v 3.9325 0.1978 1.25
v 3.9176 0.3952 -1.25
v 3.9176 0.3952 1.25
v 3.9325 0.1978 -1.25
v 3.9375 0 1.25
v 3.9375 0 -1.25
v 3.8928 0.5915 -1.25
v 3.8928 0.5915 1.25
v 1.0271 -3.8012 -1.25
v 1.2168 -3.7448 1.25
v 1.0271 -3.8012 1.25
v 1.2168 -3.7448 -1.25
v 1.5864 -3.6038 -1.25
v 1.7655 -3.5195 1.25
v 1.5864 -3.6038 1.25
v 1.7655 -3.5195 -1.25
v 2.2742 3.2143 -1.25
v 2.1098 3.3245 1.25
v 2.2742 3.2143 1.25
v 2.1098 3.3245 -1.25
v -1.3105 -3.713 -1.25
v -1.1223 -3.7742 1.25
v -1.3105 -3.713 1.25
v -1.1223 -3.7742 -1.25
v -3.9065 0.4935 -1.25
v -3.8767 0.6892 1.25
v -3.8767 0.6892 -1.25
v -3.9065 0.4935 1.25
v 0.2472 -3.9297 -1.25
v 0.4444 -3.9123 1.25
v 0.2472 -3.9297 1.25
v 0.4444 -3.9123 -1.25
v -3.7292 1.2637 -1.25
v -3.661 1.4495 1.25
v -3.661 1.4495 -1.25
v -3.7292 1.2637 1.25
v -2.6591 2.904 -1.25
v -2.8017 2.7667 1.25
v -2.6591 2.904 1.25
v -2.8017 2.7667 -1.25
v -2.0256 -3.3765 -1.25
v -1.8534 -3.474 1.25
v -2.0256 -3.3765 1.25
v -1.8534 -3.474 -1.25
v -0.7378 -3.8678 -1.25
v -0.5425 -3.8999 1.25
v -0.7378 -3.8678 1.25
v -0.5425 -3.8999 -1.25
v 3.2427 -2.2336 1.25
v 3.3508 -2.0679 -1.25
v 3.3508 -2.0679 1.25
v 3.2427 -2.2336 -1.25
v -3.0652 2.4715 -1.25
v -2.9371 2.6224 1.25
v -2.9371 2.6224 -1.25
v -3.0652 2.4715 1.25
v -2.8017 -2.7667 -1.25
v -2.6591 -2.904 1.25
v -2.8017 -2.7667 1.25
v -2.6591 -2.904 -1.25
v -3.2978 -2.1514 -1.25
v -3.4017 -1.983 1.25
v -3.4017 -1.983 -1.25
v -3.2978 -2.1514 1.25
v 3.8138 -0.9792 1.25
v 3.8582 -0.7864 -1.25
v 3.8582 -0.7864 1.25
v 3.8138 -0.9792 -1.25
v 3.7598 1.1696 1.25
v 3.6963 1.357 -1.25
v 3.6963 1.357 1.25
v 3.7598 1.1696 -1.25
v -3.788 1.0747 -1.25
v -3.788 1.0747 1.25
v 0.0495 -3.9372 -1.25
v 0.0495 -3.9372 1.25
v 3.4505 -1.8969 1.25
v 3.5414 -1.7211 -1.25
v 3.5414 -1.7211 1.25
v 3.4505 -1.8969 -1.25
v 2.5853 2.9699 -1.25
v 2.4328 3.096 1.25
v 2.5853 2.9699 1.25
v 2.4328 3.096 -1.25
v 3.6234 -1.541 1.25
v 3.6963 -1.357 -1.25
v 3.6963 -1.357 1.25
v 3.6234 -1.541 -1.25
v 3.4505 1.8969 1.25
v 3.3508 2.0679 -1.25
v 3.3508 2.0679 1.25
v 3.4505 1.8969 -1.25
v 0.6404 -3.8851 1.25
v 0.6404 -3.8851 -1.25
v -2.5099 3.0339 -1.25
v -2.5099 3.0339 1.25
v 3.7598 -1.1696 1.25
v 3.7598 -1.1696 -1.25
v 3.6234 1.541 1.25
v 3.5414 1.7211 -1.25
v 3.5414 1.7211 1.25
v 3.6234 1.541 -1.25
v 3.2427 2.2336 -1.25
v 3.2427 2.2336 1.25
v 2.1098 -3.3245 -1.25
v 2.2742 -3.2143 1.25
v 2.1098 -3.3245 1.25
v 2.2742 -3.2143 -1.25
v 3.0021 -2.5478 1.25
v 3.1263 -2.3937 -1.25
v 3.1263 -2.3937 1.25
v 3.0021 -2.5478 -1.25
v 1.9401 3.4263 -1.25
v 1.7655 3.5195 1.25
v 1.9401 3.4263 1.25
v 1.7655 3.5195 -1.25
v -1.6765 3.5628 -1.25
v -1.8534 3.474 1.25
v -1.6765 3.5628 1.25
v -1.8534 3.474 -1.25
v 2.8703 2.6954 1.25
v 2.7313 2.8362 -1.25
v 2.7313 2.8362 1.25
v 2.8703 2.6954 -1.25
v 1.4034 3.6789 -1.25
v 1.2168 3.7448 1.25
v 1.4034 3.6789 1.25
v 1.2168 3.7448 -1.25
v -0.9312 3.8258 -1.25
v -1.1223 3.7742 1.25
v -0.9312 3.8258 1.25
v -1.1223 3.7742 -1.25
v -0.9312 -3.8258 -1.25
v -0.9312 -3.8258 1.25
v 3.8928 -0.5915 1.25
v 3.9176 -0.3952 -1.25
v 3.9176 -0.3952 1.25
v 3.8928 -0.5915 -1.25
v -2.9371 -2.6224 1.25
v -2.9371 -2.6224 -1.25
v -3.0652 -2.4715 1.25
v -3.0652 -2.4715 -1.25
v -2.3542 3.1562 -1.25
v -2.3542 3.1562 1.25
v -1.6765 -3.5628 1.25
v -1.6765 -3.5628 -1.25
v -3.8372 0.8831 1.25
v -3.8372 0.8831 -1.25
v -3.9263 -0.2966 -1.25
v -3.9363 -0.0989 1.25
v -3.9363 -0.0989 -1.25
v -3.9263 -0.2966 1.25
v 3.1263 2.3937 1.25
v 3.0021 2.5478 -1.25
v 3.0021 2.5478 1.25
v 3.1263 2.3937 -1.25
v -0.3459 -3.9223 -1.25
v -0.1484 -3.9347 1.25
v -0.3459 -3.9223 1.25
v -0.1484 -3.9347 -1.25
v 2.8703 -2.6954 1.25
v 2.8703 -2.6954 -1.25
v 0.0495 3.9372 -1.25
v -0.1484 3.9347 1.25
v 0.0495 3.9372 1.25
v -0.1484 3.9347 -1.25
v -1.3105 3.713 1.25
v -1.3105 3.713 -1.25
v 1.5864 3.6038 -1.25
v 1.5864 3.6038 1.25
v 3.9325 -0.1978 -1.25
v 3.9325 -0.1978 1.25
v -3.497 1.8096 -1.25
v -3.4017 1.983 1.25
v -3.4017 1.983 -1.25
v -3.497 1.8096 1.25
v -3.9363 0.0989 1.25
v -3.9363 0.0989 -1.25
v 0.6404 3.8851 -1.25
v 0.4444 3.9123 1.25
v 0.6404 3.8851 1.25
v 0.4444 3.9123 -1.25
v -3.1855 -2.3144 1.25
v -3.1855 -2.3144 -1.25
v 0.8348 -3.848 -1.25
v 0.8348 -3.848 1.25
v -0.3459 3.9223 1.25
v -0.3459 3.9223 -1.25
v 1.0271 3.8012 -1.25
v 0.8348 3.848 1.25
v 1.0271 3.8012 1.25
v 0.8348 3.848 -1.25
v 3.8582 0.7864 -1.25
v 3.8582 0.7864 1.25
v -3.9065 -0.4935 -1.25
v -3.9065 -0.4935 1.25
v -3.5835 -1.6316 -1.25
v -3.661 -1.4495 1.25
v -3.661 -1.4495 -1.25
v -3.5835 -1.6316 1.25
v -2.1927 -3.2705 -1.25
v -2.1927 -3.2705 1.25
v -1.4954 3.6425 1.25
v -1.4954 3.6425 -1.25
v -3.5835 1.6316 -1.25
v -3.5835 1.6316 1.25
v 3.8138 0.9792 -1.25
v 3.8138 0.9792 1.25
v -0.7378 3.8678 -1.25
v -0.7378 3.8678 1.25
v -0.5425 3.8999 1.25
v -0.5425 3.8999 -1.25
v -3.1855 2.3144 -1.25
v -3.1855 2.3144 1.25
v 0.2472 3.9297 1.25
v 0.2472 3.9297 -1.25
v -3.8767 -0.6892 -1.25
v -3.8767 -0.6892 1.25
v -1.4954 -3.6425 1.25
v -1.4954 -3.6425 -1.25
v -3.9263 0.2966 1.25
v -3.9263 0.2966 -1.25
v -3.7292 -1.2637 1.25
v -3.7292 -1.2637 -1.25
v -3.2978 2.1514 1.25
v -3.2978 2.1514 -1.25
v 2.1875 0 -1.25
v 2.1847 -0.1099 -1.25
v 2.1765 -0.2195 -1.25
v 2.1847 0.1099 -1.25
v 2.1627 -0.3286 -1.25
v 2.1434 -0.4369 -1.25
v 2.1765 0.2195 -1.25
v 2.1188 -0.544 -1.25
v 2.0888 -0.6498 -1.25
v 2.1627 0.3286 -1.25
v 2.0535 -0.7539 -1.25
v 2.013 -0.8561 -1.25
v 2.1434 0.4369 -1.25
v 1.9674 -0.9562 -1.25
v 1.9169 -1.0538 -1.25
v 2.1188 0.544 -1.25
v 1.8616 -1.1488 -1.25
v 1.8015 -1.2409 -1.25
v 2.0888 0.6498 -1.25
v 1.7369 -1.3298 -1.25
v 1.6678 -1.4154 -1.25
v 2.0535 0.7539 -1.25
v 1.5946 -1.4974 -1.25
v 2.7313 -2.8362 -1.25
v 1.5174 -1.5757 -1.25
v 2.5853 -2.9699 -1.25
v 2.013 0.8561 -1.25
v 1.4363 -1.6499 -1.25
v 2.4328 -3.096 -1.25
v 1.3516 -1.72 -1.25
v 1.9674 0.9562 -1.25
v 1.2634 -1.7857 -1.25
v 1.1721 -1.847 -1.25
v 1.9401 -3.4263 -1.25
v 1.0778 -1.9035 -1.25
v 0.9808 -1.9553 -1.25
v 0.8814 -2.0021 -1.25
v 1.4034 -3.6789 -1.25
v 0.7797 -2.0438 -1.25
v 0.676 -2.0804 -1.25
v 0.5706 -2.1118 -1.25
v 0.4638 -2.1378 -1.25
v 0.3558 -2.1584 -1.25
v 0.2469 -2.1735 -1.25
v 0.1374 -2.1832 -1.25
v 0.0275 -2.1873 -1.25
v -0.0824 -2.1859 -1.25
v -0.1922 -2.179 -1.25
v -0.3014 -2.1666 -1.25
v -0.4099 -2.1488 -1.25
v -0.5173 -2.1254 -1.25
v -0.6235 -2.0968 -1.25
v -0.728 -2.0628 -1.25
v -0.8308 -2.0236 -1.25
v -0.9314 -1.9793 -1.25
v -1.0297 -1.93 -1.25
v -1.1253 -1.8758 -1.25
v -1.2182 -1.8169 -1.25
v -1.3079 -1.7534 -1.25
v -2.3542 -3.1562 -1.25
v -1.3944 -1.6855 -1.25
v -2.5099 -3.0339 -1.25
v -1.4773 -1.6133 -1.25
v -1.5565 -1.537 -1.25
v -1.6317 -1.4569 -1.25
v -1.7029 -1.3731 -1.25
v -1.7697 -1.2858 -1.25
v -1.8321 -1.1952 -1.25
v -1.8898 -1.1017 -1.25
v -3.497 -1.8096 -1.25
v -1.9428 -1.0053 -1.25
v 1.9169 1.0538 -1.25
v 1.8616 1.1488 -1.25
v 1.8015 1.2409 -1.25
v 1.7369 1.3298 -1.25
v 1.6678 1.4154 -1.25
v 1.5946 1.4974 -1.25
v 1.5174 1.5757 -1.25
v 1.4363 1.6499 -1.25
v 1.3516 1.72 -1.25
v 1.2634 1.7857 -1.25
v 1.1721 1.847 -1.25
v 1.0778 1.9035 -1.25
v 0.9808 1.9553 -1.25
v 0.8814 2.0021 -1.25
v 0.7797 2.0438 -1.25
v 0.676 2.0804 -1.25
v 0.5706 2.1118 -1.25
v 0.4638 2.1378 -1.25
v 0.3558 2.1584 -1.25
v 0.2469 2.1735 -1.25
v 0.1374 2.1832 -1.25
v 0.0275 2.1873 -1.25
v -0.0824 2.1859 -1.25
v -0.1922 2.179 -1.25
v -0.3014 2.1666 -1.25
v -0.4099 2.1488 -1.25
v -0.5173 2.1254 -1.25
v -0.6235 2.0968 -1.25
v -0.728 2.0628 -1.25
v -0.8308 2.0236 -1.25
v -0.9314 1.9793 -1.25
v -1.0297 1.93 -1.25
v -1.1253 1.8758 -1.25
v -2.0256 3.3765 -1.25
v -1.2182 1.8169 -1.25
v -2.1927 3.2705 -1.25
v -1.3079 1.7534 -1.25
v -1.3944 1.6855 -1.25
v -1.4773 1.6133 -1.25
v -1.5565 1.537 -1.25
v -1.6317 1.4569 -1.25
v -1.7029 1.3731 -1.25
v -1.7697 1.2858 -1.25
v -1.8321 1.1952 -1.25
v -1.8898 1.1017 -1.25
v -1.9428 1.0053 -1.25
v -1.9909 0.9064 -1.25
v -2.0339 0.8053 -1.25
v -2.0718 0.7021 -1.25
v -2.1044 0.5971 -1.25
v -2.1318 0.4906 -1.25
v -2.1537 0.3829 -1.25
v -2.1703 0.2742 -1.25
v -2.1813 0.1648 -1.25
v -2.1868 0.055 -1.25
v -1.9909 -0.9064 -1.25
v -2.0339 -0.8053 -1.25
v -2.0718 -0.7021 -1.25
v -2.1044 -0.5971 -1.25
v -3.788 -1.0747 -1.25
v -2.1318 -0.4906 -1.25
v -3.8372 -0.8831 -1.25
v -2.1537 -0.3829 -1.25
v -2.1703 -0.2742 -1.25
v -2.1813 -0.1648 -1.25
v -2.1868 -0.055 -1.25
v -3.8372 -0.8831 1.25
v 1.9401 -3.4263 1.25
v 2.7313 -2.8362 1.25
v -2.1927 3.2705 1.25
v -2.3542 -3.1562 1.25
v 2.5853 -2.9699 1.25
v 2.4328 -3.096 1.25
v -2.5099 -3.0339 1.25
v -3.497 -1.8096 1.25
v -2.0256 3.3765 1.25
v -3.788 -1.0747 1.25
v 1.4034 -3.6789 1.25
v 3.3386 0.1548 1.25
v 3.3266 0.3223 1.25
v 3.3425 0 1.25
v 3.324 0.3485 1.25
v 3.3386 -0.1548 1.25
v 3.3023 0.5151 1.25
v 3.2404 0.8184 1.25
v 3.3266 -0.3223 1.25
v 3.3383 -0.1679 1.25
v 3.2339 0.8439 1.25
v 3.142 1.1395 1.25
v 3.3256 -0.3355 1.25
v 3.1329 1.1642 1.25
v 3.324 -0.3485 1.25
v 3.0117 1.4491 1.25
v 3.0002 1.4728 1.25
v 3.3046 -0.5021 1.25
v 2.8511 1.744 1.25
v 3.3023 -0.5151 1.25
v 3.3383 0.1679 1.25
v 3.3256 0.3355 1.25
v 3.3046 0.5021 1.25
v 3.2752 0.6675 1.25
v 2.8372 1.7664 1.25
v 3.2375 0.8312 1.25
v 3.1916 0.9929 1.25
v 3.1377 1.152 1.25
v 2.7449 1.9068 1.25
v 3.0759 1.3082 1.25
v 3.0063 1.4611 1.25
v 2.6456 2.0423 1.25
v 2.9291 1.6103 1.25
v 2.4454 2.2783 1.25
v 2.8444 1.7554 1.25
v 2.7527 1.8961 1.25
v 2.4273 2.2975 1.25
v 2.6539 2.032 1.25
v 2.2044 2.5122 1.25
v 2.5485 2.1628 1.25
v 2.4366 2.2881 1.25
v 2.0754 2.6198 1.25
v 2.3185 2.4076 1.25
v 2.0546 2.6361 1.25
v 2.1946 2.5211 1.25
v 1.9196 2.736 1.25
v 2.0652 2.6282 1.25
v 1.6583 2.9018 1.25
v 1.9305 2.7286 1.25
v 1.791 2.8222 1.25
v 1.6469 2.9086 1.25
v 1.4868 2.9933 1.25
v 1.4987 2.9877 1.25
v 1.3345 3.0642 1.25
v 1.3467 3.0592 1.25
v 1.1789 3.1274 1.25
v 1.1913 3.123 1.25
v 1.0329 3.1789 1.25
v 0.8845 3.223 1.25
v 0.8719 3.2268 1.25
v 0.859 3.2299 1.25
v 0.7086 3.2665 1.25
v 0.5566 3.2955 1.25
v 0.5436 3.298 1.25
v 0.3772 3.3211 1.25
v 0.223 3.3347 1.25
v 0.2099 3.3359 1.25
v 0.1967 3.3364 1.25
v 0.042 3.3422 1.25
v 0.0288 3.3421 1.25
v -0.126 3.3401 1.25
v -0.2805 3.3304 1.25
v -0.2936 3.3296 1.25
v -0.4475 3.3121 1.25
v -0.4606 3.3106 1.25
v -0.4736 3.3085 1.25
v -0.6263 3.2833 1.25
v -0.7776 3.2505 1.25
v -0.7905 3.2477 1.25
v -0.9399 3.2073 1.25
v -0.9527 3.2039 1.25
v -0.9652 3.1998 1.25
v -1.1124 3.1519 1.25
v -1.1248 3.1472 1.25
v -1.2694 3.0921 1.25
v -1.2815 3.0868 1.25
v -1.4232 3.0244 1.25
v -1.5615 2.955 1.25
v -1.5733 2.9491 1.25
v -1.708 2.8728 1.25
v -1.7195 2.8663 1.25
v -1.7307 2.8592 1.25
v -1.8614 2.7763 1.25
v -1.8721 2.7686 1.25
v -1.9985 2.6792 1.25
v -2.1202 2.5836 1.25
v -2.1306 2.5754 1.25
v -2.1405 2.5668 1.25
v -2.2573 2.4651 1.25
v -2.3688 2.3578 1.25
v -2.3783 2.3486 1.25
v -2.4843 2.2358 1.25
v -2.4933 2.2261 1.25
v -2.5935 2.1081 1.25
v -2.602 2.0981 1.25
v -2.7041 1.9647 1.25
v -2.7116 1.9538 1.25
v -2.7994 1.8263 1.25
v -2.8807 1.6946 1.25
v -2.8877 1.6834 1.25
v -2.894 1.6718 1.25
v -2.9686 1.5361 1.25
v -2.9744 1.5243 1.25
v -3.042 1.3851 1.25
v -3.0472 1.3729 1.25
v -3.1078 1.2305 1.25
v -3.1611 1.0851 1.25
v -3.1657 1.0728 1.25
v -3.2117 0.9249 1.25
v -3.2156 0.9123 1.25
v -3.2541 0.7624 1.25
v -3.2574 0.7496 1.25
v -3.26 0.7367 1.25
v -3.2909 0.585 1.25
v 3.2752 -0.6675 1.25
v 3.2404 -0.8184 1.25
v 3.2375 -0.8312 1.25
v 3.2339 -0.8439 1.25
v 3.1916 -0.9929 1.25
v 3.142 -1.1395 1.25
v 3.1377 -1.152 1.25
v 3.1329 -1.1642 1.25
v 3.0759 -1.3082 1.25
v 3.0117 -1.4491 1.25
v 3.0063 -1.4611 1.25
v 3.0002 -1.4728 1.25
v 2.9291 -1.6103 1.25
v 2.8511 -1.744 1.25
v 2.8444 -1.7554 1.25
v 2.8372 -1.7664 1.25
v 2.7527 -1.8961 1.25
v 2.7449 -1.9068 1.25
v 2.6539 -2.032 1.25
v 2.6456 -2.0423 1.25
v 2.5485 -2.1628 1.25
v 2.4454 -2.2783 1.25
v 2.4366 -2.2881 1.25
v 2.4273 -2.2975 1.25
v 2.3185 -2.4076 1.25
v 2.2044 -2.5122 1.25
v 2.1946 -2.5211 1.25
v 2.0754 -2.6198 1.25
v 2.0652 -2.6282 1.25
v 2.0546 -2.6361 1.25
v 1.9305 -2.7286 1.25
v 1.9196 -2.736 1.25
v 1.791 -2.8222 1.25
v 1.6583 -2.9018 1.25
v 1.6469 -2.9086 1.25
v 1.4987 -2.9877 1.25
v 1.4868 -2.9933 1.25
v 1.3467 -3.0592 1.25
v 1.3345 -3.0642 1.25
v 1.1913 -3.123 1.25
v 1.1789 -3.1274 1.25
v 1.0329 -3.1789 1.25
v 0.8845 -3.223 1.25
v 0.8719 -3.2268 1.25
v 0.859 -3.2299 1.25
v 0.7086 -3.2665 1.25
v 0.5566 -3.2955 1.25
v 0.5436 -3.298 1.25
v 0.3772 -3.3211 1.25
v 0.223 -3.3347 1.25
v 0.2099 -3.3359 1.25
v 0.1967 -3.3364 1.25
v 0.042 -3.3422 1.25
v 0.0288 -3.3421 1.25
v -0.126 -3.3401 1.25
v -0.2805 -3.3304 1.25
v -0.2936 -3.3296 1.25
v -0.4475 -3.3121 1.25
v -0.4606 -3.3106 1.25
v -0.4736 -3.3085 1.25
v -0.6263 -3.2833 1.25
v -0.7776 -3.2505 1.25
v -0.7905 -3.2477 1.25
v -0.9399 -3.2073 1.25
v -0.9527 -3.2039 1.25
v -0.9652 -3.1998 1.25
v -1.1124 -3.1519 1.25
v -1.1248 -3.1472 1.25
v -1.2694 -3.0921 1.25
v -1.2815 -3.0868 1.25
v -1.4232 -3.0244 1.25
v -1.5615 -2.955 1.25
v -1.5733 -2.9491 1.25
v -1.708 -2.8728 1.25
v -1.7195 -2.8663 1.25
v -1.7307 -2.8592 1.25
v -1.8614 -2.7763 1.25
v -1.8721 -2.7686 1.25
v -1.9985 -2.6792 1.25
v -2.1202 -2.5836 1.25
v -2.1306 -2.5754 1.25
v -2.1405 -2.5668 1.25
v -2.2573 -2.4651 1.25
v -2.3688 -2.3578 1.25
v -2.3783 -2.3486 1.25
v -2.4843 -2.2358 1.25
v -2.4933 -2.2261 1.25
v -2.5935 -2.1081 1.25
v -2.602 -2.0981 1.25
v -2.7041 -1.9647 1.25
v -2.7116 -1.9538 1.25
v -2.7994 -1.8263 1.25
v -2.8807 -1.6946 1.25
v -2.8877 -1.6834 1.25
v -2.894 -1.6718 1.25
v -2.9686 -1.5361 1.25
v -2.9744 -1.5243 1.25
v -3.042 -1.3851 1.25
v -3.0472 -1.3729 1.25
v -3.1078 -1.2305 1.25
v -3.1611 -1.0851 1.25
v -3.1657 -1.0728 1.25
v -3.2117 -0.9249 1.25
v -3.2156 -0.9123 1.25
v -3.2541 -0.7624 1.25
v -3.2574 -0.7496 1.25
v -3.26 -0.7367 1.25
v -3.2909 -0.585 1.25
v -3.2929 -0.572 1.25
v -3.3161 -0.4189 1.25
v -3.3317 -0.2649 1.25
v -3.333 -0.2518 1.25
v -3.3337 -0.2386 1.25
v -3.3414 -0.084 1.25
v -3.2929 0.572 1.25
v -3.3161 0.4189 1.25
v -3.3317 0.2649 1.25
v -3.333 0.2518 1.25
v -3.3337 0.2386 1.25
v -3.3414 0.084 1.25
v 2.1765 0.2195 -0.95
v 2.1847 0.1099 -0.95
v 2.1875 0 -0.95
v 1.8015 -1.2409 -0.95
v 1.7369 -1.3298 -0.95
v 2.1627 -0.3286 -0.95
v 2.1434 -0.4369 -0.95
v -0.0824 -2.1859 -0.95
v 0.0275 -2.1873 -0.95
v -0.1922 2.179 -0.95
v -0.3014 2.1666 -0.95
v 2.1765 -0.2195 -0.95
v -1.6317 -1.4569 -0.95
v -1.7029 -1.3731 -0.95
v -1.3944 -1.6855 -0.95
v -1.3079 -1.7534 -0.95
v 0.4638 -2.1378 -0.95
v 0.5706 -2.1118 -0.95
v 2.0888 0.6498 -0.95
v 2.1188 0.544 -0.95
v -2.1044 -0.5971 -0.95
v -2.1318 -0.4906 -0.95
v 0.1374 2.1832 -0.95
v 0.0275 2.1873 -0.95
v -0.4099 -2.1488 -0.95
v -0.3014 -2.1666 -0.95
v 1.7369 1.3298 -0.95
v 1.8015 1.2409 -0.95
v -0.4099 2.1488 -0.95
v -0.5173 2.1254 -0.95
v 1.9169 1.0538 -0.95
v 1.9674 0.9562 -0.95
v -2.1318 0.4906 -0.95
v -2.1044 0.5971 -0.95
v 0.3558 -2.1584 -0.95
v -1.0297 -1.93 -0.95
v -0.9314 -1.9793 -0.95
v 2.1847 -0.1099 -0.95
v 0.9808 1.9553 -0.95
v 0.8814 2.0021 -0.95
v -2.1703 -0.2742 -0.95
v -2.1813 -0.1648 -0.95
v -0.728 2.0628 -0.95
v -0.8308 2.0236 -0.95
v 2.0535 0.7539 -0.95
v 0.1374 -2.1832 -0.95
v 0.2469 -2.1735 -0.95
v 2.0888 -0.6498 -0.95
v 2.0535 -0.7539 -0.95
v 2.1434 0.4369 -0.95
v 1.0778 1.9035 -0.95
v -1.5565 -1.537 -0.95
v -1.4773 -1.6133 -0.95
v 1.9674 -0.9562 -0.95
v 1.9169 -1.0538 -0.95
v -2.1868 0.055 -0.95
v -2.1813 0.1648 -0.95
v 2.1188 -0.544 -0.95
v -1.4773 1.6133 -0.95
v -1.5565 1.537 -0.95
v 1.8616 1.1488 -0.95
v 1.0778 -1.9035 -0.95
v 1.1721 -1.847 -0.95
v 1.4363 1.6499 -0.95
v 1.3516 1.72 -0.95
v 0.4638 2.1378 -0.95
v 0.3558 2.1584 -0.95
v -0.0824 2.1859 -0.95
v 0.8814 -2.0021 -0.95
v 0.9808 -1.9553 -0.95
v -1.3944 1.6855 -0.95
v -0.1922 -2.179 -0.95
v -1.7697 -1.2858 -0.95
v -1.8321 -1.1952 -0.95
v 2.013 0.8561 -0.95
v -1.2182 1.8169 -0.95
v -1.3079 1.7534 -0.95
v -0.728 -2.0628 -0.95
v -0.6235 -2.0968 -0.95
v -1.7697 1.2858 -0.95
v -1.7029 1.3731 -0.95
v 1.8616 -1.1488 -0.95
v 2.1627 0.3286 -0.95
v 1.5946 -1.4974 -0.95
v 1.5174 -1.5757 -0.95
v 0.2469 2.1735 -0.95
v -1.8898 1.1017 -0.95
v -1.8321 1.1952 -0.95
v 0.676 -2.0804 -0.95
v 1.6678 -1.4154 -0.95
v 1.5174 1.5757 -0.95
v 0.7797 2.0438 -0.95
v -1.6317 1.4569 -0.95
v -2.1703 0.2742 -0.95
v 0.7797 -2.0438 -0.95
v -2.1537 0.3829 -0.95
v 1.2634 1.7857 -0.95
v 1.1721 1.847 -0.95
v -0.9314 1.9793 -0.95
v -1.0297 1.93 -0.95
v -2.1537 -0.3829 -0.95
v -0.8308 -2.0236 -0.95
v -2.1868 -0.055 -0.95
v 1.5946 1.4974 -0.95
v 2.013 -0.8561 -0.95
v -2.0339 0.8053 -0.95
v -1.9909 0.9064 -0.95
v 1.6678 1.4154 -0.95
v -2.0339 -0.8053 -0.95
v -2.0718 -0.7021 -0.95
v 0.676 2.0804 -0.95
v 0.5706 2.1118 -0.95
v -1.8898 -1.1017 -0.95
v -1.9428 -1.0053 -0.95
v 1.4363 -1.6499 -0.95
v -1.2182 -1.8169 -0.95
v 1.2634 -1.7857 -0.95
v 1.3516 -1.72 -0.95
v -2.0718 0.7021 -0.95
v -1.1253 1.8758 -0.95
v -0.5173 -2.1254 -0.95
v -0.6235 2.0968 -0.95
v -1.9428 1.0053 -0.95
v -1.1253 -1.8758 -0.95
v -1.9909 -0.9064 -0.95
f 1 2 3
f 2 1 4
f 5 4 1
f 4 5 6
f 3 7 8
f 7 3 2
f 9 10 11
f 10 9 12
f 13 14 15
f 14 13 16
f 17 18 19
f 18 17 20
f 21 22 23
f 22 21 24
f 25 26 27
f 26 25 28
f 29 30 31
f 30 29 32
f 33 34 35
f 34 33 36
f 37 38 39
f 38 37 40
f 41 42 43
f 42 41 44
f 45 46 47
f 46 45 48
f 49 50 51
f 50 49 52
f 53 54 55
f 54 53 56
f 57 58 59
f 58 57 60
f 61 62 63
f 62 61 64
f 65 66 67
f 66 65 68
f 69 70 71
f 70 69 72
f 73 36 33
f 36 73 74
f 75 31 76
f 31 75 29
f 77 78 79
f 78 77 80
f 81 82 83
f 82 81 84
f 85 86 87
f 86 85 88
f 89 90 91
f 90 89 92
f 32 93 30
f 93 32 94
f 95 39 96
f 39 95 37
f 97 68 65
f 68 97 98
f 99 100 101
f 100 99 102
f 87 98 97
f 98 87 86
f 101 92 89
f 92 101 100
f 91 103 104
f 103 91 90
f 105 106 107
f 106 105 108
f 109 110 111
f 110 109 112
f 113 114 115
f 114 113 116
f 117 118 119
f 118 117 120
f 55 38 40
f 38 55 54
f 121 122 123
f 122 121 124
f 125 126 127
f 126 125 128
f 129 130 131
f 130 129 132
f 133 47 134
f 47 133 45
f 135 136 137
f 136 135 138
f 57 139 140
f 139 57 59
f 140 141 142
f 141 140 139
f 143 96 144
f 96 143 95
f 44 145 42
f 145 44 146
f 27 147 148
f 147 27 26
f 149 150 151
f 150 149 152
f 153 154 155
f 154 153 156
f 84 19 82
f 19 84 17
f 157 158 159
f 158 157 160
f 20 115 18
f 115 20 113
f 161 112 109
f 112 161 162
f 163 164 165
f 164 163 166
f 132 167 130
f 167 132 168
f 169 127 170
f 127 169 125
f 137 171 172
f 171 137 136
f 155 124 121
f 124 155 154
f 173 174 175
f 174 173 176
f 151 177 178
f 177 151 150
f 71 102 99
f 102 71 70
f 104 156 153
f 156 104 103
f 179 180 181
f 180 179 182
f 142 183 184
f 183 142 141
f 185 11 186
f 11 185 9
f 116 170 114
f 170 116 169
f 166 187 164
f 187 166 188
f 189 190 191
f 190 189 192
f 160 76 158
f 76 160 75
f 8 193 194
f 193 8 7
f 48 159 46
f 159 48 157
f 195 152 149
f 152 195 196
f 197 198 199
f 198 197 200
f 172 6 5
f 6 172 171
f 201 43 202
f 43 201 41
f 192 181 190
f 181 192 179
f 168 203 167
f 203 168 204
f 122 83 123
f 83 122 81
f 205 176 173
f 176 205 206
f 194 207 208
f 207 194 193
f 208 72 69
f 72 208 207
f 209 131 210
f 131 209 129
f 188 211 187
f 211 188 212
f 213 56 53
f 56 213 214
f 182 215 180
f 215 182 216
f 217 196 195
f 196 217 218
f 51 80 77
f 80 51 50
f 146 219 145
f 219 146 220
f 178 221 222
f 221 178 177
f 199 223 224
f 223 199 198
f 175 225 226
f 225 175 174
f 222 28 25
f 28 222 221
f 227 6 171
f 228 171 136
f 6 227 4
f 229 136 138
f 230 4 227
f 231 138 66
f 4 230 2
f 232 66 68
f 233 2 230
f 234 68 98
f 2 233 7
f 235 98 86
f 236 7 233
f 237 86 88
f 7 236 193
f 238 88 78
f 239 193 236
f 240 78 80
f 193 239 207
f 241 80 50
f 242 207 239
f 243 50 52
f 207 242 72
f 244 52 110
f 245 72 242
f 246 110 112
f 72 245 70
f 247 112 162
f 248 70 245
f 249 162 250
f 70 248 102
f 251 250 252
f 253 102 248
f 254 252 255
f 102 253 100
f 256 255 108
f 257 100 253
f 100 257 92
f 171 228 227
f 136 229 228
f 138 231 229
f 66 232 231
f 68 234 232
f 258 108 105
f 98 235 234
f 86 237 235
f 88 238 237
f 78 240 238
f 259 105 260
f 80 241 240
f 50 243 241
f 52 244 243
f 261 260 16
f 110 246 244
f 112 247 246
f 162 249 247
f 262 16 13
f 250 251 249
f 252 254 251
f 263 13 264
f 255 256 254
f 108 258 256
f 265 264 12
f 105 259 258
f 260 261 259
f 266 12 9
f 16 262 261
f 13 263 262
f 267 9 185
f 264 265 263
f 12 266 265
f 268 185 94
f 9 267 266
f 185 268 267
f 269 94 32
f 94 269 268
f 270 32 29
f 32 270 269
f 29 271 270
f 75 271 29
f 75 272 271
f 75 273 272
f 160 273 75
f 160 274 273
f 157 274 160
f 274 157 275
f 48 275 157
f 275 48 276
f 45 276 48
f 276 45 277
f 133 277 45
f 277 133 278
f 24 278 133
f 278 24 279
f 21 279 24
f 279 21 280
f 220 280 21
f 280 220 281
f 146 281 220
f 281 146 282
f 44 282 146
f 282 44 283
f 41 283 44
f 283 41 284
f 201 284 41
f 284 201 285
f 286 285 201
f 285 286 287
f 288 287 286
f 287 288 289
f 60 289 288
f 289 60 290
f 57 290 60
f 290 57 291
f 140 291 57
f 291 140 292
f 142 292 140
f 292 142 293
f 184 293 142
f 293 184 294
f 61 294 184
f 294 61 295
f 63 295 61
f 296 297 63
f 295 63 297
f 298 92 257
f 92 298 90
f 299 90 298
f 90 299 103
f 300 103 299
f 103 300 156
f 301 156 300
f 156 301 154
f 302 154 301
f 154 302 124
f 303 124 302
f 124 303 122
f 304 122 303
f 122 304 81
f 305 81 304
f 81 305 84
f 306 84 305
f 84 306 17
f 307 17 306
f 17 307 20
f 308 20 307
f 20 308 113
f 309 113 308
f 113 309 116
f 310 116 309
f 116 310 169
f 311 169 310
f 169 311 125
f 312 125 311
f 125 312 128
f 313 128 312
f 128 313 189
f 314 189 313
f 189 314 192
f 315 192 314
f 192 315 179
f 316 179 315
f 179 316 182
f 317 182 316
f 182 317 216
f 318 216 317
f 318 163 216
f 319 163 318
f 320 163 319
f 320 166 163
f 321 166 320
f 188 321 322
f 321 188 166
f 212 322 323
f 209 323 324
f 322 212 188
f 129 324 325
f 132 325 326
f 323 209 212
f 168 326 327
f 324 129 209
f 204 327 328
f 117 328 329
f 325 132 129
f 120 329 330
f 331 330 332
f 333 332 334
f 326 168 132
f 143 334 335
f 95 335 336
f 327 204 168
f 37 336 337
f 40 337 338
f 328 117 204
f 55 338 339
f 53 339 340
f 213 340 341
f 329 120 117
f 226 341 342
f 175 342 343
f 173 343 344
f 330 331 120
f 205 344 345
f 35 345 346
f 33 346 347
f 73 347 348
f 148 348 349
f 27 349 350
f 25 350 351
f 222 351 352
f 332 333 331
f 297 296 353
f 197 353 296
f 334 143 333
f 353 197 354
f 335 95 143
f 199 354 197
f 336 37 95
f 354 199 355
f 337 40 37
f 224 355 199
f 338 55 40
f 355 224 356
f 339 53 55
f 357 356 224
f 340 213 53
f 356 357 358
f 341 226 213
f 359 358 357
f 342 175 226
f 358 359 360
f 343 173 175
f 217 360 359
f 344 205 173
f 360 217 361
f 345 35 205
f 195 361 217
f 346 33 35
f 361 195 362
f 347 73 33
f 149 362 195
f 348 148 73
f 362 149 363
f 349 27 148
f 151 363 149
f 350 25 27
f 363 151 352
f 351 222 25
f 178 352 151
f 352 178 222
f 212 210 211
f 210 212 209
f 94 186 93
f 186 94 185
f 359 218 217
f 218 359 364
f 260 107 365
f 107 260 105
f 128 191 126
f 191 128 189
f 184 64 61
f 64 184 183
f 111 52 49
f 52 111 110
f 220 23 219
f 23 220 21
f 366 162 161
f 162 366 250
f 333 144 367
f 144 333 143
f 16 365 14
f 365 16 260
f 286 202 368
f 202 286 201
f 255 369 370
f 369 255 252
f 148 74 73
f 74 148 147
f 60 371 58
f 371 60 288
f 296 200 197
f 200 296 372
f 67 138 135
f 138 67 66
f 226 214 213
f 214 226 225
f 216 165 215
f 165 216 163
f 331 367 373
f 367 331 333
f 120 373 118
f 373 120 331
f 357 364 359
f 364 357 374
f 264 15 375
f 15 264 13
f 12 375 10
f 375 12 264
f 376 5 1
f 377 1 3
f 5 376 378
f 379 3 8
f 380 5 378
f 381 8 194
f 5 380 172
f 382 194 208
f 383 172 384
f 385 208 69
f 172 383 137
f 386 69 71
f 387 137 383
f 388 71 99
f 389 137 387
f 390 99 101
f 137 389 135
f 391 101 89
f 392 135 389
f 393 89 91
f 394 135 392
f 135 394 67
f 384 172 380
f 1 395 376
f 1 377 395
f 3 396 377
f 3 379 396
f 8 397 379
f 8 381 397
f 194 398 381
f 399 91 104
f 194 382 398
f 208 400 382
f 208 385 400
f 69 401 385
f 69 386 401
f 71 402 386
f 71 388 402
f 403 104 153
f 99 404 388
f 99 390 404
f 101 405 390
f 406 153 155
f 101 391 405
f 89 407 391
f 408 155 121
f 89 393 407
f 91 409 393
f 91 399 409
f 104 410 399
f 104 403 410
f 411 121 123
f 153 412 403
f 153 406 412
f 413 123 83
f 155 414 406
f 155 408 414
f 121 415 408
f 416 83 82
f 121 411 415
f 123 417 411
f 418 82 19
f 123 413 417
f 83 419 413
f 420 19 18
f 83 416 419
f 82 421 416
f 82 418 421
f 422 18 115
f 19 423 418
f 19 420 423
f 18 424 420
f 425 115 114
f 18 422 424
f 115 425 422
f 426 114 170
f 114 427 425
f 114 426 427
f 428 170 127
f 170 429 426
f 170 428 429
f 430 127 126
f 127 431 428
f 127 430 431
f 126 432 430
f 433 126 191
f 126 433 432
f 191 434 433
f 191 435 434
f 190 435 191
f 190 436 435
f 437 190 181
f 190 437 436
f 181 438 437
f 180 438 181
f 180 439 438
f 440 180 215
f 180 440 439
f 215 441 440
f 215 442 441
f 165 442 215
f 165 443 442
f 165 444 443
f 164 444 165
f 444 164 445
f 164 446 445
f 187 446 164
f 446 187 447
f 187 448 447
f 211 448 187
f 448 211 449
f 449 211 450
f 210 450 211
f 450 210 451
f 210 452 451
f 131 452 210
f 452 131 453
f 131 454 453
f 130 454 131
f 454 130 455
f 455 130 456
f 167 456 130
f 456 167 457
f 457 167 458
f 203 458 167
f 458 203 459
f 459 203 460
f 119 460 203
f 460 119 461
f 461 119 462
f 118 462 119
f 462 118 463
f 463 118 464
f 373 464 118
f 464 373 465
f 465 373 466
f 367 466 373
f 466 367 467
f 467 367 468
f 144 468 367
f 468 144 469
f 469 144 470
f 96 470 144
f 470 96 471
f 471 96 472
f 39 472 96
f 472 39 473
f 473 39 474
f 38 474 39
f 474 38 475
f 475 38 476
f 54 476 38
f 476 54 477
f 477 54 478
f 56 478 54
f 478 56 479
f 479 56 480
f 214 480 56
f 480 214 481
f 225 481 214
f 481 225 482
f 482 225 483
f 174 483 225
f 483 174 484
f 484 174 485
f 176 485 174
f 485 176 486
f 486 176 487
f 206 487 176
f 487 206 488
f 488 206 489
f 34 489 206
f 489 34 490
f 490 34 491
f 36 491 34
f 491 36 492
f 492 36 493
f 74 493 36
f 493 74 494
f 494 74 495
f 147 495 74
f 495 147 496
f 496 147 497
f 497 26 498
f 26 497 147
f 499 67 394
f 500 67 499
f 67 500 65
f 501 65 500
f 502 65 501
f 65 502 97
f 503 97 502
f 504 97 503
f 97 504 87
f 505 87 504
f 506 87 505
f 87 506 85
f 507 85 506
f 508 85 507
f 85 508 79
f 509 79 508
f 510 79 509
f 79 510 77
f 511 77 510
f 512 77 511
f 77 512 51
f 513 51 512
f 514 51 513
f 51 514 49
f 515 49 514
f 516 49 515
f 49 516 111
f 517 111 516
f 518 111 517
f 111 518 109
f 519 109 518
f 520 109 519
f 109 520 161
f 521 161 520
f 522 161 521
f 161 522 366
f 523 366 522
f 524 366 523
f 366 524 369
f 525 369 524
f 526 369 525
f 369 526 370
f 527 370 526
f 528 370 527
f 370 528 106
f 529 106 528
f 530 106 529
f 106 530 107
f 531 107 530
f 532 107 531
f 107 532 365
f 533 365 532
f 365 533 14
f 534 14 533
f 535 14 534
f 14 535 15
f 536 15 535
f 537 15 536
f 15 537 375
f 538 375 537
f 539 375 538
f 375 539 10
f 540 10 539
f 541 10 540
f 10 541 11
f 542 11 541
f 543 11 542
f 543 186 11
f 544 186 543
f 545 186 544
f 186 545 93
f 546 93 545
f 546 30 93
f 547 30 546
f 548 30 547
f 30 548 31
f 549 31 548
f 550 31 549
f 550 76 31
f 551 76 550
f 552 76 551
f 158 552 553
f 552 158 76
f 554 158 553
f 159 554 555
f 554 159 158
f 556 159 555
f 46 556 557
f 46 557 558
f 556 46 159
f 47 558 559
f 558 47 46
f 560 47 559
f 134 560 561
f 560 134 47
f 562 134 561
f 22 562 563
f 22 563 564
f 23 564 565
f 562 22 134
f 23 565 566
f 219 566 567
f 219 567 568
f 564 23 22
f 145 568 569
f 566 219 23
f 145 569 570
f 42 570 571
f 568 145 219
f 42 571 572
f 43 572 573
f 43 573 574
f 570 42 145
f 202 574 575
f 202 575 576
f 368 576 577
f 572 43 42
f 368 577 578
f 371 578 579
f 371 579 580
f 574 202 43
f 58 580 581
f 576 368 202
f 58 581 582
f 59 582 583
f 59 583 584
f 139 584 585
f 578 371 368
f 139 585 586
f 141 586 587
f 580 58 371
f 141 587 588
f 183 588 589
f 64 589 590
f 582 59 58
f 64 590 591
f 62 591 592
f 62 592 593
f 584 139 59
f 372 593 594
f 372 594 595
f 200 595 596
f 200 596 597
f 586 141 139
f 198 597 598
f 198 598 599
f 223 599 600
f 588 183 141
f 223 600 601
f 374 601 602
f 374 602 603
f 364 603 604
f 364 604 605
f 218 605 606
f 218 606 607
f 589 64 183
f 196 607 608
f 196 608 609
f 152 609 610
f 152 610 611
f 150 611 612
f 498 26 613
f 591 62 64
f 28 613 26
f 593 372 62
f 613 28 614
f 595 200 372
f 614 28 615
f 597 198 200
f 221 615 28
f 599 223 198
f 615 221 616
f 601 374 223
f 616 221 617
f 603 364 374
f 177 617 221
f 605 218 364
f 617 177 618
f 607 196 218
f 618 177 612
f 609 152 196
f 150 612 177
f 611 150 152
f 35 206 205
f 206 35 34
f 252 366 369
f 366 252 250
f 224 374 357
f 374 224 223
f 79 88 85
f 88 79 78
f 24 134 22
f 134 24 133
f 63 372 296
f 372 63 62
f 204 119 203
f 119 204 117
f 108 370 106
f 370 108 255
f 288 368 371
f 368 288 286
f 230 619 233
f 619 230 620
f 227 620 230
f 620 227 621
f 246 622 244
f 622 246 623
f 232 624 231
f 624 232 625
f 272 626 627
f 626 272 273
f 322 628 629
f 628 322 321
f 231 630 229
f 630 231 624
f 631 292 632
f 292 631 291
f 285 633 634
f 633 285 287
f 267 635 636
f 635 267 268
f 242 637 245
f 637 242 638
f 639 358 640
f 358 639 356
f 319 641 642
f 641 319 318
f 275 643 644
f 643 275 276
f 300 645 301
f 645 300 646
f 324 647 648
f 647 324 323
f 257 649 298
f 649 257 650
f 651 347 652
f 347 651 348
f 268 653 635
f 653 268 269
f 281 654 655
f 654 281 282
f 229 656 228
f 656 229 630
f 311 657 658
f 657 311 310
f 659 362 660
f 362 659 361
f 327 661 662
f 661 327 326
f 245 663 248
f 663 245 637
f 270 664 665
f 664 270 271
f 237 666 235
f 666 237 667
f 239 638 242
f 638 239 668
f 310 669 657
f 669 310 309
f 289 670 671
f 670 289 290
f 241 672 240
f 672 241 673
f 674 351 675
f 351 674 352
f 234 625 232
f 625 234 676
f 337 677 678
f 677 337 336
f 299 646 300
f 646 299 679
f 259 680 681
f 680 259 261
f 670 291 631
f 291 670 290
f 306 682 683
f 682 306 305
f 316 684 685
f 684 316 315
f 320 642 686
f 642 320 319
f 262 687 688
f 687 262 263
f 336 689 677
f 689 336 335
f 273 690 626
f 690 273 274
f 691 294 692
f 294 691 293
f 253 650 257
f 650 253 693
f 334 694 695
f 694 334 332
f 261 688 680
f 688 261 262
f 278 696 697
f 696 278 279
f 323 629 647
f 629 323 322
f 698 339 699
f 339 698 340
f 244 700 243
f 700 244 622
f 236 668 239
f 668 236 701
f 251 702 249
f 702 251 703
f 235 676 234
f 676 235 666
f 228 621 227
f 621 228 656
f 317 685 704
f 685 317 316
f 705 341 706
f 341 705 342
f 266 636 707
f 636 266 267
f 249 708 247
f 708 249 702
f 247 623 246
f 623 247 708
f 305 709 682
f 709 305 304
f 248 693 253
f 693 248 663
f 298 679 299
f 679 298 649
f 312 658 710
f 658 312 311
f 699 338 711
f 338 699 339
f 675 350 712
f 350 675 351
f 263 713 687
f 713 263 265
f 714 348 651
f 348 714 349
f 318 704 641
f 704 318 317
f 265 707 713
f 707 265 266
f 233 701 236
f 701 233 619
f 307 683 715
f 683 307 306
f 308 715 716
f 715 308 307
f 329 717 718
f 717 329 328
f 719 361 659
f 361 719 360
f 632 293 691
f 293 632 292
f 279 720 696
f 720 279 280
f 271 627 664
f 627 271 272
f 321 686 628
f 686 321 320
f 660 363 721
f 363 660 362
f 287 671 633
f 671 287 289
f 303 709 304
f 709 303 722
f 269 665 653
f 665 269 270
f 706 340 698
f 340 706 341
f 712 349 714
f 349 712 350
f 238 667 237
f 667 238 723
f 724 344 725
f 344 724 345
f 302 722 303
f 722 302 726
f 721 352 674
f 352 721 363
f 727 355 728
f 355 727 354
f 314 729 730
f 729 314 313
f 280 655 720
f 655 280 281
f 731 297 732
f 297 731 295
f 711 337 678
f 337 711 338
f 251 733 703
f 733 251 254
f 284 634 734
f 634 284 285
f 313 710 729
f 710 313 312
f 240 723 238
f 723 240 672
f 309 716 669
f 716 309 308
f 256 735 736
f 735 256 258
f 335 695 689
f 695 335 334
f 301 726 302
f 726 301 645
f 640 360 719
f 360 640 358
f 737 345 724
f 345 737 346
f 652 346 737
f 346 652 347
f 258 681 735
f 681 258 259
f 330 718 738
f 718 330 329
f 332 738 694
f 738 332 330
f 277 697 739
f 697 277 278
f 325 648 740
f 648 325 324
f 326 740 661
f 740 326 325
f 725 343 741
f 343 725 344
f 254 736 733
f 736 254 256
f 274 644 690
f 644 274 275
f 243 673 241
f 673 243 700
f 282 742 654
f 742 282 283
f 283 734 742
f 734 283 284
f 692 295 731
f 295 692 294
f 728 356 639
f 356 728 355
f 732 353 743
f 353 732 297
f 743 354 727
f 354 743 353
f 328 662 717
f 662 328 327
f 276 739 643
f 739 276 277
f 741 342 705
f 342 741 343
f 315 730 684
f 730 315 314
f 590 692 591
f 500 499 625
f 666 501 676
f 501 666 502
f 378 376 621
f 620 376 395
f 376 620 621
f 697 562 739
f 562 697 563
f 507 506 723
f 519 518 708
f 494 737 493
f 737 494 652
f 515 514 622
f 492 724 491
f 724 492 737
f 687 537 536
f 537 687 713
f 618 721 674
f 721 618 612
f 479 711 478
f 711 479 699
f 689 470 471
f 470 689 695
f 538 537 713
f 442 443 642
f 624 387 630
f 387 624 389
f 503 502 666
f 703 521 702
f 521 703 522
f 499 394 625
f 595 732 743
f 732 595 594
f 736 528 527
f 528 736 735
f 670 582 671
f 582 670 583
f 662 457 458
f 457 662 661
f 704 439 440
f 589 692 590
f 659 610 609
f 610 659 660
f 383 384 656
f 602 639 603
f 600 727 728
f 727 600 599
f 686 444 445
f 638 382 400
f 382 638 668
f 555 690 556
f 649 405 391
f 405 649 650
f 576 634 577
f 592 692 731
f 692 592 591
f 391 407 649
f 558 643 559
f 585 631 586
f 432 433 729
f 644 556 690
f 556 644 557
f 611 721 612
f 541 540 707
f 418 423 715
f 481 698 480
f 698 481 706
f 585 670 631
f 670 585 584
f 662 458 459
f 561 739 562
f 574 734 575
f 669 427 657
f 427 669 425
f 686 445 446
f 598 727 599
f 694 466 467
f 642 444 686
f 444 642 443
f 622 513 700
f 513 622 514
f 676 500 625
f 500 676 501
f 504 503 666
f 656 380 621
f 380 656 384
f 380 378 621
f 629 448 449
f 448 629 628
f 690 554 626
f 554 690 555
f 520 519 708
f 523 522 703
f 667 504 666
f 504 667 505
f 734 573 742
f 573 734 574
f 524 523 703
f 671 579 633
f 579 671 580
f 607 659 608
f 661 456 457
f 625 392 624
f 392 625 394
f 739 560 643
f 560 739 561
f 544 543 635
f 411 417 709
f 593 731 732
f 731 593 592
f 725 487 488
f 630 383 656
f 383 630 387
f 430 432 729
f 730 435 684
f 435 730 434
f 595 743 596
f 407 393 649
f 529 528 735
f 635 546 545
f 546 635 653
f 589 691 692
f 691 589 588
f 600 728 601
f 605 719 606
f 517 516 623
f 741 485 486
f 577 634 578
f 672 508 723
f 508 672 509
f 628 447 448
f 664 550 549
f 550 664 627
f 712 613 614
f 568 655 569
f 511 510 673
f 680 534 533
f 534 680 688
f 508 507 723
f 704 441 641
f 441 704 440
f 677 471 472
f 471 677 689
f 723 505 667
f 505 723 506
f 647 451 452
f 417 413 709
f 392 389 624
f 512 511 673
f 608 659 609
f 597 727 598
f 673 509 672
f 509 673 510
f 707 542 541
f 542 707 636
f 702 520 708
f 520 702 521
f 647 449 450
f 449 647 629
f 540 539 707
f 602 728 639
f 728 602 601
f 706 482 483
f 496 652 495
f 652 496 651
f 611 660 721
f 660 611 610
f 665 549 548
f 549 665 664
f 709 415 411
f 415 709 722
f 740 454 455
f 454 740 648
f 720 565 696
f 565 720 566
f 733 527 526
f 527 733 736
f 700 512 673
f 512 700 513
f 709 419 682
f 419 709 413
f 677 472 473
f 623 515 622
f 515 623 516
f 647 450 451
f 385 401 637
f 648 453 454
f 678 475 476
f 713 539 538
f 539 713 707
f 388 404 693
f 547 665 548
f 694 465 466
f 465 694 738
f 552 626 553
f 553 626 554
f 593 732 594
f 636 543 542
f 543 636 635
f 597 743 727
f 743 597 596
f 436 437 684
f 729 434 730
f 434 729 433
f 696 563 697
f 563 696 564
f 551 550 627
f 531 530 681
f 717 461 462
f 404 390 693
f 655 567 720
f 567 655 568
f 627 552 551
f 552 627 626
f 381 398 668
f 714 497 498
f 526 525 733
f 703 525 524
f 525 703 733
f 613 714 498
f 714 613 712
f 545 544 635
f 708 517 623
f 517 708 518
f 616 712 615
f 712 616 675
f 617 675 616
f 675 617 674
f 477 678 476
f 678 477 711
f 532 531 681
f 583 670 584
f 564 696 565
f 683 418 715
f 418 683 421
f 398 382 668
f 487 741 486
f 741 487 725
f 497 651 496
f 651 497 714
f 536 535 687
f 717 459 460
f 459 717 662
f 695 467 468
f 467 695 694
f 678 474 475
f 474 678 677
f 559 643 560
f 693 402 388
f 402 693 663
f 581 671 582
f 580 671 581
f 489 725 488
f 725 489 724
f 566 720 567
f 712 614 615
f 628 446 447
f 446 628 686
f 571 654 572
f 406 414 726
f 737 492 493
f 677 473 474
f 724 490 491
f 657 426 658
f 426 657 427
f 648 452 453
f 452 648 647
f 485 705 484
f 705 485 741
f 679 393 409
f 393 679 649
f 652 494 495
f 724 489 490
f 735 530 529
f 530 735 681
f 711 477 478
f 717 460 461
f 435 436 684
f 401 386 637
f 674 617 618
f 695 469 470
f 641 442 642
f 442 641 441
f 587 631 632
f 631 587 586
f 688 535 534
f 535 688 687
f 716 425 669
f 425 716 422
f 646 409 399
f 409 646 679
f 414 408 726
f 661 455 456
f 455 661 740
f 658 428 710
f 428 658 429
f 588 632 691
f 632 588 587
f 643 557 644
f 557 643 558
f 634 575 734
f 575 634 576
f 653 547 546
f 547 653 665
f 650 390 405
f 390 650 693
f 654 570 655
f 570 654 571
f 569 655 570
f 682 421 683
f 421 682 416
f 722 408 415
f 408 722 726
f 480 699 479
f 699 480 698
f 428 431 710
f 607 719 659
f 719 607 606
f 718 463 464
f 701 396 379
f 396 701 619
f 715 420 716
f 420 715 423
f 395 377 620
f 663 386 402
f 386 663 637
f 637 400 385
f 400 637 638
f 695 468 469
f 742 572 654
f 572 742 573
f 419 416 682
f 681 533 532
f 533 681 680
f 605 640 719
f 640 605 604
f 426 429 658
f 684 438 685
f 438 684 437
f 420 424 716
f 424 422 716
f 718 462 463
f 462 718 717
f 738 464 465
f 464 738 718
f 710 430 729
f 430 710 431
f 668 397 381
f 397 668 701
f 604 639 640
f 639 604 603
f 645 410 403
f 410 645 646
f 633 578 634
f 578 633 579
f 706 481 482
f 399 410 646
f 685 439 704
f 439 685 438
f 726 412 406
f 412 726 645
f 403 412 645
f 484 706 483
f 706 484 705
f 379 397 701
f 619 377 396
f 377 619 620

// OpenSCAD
// created by AkytharPandaaa
// encoding: utf-8

/* tolerance:
  0.1 tight fit
  0.15 fits
  0.2 loose fit */

$fn = $preview ? 25 : 125;

module countersunk_washer(diameter, height=2.5) {
  difference() {
    cylinder(h = height, d=diameter * 2.25, center = true);
    cylinder(h = height + .2, d=diameter * 1.25, center = true);
    translate(v = [0,0,.3]) cylinder(h = height, d1=diameter * 1.25, d2=diameter * 2, center = true);
  }
}

countersunk_washer(diameter = 3.5);
